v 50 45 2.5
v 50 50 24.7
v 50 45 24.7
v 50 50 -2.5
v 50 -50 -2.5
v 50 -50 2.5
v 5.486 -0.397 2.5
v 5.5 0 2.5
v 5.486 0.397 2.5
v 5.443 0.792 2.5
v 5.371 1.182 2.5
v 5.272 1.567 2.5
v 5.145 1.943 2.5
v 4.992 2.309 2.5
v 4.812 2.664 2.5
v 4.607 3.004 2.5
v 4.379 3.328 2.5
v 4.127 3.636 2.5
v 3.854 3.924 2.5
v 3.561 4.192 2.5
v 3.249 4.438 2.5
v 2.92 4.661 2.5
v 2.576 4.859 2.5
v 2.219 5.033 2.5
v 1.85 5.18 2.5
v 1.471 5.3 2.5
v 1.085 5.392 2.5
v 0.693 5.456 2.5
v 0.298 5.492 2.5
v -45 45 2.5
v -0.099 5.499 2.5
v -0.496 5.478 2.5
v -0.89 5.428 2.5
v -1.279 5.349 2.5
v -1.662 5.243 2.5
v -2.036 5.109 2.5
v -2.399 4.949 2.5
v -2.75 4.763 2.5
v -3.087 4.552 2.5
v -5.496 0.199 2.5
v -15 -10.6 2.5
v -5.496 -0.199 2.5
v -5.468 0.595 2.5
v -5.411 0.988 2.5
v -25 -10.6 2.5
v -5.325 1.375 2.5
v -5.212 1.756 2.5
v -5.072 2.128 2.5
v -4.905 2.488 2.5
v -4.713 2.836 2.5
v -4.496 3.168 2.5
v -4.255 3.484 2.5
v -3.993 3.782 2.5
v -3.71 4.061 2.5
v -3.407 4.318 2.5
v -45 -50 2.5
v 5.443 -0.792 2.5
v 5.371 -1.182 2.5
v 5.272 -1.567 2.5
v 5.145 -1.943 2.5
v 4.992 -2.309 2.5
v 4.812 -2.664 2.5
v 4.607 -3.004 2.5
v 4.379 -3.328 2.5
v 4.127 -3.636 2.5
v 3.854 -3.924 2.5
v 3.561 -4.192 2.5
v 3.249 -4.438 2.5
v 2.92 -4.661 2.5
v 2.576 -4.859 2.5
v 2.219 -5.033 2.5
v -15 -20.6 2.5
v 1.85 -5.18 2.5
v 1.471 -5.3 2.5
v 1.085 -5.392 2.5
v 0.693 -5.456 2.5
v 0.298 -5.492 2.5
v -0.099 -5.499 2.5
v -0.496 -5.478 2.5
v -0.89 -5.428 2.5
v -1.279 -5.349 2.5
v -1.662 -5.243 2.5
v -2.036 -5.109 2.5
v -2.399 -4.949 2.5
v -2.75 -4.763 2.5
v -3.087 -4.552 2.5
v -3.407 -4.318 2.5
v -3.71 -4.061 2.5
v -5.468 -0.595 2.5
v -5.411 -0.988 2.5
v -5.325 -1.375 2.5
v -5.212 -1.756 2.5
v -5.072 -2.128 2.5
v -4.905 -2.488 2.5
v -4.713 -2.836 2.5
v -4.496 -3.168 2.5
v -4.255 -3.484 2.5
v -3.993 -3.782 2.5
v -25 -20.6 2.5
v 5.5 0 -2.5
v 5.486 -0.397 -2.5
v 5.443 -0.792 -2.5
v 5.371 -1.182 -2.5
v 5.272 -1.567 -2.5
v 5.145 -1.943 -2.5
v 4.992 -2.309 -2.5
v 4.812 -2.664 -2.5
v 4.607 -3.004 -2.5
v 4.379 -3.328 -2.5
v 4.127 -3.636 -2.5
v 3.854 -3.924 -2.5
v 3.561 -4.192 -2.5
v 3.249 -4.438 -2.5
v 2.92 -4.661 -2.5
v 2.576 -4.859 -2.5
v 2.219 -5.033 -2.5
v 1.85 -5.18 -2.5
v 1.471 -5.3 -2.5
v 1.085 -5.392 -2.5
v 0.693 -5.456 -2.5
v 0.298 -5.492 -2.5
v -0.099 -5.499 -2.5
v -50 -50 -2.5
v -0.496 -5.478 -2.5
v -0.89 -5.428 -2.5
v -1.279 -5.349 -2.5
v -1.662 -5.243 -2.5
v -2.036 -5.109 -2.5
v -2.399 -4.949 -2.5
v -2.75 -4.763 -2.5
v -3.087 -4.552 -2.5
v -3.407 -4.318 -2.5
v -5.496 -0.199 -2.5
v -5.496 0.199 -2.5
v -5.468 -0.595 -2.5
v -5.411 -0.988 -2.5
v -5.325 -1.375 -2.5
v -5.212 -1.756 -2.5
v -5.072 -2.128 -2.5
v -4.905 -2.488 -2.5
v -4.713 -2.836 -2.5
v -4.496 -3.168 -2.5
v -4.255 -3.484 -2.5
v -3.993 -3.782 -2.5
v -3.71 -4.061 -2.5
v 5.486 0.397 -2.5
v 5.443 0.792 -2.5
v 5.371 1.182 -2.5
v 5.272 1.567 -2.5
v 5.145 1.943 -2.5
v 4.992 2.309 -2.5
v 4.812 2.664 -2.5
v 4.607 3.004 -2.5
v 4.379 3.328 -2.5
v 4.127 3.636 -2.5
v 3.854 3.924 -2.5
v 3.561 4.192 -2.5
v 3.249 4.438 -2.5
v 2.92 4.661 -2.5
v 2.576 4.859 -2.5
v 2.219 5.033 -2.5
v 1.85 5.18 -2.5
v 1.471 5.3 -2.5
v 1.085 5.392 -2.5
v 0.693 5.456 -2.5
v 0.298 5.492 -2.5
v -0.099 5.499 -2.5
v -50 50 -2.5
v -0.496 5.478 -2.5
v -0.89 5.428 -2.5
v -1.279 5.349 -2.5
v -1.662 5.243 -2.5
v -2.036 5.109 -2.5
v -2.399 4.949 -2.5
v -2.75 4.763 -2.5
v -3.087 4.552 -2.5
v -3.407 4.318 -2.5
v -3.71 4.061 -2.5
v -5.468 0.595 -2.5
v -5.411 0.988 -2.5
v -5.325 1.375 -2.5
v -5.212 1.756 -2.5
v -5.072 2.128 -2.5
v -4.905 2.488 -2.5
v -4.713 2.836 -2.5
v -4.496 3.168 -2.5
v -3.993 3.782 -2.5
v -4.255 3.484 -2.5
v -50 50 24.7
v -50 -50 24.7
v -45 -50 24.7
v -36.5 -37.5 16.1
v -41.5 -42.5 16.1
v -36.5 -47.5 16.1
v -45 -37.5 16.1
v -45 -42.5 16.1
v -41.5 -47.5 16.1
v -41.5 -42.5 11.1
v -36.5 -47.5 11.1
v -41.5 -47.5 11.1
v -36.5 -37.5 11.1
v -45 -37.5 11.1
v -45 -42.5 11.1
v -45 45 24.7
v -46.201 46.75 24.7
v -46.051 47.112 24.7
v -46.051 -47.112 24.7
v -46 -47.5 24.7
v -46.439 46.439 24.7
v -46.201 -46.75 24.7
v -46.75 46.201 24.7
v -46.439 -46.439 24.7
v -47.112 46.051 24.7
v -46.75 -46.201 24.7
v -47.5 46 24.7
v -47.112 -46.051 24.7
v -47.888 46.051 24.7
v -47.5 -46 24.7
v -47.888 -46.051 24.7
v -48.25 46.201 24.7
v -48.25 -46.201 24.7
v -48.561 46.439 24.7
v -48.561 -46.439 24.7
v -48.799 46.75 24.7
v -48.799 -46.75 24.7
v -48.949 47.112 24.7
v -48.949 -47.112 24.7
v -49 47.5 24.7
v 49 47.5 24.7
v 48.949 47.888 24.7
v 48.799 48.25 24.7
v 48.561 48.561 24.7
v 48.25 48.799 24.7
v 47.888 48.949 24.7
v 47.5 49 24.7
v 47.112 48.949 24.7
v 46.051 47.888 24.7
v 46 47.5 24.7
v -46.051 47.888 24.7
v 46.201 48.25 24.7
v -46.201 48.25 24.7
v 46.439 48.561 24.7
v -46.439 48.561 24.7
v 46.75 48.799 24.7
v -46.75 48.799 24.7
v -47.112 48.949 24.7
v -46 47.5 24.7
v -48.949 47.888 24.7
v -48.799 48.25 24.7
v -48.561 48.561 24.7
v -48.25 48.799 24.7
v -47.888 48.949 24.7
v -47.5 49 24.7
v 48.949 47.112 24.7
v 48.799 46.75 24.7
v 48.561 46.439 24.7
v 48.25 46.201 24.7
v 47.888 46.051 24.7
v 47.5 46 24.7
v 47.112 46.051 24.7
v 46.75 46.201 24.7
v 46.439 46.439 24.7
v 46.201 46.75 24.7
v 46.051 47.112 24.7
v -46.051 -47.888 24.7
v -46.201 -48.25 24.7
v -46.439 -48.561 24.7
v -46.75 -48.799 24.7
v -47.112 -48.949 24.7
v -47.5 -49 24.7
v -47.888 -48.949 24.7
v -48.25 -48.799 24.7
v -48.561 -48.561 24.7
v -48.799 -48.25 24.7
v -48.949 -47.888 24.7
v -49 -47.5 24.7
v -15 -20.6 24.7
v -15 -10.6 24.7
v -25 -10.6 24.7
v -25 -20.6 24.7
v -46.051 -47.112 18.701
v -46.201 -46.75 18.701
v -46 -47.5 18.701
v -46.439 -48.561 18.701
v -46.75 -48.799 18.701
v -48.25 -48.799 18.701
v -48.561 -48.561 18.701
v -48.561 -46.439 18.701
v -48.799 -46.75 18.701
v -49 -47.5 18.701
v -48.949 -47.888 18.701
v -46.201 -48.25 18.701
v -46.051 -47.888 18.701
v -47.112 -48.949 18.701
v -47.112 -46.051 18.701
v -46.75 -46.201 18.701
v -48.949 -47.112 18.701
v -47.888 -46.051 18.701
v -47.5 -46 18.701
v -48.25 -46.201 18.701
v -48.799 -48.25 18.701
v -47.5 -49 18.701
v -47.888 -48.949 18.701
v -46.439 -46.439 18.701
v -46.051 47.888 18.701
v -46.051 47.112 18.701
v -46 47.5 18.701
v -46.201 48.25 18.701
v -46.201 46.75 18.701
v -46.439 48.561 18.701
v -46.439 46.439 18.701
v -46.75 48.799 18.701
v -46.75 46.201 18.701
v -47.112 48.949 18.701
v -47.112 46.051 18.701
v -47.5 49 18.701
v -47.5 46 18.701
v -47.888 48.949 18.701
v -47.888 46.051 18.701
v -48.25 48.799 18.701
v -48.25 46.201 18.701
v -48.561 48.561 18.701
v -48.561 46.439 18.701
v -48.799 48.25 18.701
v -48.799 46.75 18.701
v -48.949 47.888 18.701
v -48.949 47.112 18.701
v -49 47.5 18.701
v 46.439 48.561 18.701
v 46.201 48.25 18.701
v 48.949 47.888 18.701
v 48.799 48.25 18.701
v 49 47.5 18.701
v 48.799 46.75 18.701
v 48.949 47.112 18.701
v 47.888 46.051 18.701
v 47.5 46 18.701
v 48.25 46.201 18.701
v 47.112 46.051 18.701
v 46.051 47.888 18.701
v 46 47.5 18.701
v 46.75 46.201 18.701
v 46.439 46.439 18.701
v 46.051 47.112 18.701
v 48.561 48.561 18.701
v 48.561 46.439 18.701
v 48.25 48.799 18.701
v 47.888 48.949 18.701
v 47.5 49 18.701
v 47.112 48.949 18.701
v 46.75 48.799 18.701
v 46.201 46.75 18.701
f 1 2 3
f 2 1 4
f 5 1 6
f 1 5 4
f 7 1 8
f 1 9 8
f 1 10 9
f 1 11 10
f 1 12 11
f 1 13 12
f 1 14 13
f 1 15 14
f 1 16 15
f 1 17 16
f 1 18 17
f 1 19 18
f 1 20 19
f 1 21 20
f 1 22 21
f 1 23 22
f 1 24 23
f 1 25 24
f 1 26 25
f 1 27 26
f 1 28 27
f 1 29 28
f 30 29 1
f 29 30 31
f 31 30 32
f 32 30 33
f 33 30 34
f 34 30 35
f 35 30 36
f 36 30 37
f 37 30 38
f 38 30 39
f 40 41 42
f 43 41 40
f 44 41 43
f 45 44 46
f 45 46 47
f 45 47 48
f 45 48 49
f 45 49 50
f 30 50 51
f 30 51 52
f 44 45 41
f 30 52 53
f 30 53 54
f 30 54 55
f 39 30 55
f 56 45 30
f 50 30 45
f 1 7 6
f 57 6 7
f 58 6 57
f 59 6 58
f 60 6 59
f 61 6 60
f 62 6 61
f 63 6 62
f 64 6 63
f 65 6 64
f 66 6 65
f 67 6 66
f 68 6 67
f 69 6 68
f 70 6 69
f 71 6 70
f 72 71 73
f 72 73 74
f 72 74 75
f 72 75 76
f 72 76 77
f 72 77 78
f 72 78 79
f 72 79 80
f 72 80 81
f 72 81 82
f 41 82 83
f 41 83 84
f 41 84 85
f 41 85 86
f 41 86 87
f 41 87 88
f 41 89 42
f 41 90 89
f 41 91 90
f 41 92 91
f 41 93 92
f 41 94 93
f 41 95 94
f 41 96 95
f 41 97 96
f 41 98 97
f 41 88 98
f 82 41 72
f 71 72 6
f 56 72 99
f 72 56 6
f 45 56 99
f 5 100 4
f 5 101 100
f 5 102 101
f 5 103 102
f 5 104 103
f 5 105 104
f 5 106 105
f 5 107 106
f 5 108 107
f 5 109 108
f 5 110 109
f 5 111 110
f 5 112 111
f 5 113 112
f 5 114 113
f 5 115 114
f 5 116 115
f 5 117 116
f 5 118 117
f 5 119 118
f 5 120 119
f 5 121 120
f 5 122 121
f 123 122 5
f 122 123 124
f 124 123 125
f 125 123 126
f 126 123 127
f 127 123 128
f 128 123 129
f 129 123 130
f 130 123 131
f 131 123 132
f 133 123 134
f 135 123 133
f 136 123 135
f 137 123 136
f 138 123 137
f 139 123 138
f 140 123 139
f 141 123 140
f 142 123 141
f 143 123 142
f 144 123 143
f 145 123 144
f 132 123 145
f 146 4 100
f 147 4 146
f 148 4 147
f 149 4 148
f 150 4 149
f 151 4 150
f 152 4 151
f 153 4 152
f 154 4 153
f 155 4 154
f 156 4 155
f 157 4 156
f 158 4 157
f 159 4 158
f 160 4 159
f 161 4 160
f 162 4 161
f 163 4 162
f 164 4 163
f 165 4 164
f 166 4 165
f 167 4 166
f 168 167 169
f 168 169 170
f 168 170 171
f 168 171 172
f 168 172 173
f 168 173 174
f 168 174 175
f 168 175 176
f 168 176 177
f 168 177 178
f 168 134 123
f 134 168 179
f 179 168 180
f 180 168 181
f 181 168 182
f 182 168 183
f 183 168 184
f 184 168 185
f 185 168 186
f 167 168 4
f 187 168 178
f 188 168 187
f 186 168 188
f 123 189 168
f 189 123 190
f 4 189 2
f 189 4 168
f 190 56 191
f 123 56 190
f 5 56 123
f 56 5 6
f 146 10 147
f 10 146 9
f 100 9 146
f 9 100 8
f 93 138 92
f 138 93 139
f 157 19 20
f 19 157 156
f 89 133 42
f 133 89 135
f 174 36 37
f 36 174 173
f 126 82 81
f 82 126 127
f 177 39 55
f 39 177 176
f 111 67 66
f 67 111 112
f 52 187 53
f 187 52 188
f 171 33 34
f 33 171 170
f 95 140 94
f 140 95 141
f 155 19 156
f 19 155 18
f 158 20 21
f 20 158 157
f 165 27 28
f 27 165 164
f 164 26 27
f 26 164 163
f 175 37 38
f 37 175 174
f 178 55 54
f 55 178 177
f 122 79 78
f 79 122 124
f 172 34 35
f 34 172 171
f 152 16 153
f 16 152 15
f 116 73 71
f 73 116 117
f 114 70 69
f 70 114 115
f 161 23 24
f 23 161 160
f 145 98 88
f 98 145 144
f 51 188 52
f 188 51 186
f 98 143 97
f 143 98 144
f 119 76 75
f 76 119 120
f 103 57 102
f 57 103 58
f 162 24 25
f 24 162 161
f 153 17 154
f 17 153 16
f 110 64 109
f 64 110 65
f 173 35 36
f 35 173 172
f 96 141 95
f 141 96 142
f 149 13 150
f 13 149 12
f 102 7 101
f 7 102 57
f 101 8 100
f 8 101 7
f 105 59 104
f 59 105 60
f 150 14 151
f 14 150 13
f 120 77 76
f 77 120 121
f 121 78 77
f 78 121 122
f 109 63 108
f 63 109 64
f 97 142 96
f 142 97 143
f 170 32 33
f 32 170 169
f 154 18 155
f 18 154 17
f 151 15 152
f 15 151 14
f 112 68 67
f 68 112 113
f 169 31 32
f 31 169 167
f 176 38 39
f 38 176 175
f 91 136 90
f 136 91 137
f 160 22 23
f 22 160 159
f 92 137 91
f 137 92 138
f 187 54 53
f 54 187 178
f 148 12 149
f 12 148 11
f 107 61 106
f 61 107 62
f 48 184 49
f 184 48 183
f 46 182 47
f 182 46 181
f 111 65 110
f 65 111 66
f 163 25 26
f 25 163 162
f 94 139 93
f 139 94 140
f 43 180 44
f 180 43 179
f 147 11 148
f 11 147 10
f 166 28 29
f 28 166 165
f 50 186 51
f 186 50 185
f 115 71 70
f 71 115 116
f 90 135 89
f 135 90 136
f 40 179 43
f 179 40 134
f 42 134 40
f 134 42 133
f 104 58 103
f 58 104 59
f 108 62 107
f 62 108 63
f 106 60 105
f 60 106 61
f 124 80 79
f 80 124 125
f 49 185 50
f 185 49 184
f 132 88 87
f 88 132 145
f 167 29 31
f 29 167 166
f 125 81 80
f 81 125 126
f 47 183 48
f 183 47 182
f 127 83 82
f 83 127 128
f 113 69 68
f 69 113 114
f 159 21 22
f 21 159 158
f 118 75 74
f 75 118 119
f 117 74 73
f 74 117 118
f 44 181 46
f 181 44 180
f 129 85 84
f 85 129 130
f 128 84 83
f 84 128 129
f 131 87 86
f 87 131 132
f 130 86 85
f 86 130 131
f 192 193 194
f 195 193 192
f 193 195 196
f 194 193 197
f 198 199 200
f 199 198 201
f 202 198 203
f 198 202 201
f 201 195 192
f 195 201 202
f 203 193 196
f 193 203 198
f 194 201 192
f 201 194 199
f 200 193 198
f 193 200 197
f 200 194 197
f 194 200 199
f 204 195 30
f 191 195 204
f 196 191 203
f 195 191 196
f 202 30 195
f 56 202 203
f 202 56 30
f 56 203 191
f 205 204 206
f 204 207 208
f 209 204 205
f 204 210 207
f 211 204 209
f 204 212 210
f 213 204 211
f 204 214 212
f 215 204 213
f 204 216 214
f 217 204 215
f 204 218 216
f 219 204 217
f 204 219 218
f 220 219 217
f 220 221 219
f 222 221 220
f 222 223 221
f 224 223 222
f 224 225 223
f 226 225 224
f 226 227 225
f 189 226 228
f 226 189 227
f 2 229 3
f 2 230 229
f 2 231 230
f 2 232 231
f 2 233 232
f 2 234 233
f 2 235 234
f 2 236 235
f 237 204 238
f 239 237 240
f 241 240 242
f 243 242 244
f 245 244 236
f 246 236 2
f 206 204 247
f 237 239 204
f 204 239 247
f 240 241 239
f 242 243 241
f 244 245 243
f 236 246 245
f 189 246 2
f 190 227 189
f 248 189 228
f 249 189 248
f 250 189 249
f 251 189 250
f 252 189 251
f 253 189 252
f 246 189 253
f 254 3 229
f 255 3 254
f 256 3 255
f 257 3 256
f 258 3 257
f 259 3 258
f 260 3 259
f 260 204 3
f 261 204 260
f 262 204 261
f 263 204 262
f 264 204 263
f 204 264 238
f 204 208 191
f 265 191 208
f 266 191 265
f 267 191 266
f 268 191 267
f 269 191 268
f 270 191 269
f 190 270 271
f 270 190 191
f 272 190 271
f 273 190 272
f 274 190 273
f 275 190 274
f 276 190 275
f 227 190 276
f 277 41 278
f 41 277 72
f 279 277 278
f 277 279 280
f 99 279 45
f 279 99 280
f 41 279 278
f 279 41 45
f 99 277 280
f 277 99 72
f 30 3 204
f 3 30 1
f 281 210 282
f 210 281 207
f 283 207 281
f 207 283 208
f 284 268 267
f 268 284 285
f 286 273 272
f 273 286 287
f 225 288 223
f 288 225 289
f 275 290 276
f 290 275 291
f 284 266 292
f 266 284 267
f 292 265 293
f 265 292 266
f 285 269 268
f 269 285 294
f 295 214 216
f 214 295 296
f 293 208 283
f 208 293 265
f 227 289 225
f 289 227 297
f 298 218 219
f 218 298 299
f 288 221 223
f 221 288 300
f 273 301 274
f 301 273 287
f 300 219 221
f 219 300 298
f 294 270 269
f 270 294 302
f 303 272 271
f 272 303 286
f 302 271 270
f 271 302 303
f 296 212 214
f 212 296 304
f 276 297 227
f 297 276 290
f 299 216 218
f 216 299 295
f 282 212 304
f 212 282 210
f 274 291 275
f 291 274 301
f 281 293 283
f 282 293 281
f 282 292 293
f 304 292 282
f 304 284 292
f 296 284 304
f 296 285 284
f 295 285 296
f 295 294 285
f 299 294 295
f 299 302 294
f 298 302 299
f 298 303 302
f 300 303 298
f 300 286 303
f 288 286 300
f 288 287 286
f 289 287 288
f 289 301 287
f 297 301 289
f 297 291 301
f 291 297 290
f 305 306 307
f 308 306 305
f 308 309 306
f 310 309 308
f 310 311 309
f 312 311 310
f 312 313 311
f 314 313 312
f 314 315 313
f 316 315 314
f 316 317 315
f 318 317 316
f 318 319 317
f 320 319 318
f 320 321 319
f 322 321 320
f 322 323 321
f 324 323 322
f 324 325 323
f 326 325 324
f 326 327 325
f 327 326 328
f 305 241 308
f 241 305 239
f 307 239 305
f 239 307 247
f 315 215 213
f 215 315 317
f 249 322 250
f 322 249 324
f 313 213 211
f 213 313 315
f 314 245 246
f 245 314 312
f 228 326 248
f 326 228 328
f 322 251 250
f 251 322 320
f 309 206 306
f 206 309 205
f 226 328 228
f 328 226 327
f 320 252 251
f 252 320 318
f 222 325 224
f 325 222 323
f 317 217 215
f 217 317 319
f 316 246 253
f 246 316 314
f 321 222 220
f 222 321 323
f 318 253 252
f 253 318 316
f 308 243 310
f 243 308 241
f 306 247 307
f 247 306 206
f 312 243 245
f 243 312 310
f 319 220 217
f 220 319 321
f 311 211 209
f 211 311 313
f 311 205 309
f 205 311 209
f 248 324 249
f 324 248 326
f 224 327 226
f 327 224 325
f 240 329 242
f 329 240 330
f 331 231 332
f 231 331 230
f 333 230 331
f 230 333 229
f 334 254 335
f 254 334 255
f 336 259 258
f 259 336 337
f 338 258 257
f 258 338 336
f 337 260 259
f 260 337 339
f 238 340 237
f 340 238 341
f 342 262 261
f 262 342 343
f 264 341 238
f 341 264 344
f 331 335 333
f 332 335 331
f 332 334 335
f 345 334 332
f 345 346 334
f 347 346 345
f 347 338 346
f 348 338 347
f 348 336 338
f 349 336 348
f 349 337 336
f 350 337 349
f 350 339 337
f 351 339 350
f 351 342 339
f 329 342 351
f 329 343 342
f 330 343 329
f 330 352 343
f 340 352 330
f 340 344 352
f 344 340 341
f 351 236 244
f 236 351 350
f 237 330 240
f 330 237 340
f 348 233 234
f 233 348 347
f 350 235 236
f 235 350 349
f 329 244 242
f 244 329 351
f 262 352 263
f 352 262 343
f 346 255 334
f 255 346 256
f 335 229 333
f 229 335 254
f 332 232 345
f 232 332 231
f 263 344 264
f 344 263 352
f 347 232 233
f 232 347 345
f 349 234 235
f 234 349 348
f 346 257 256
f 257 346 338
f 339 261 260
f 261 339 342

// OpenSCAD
$fa = 1;
$fs = 0.4;

mallet_length = 393;
mallet_sphere_radius = 39.6/2;
axel_radius = 5;
side_wall_thickness = 5;
mallet_handle_radius=9.6/2;
side_wall_center_distance = mallet_handle_radius*2+1.5+side_wall_thickness/2;

module mallet() {
    cylinder(h=mallet_length+mallet_sphere_radius, r=mallet_handle_radius);
    translate([0, 0, mallet_length+mallet_sphere_radius])
        sphere(r=mallet_sphere_radius, center=true);
}

module side_wall() {
    difference() {
        cube([100, 100, side_wall_thickness], center=true);
        translate([0, 0, 0])
            cylinder(h=side_wall_thickness+1, r=axel_radius*1.1, center=true);
    }
}

module side_wall_right() {
    difference() {
        side_wall();
        translate([0, 0, -side_wall_thickness-0.1])
            rotate([180, 0, 0])
            screw_holes(side_wall_thickness*2, 3, 50);  // 3mm width holes
    }
}

module side_wall_left() {
    wall_to_wall_distance = side_wall_center_distance*2-side_wall_thickness/2;
    side_wall();
    difference() {
        union() {
            translate([-20, -(mallet_handle_radius*2+5)-1, wall_to_wall_distance/2])//The -1 give some space for the felt stopper
                cube([10,10,wall_to_wall_distance],center=true);
            translate([-50, -50, 0])
                union() {
                    cube([side_wall_thickness, 100, wall_to_wall_distance]);
                    translate([side_wall_thickness+2, 10, wall_to_wall_distance/2+side_wall_thickness/4])
                        union(){
                        cube([10,5,5],center= true);    
                        translate([4,-2.5,0])
                            cube([5,10,5],center=true);
                        }
                };
            translate([-50, 50, 0])
                rotate([0, 0, -90])
                cube([side_wall_thickness, 100, wall_to_wall_distance]);
        }
        translate([0, 0, wall_to_wall_distance])
            screw_holes(6, 3, 50);  // 6mm deep 3mm width holes
    }
}

module mallet_car() {
    difference() {
        union() {
            cylinder(h=70, r=mallet_handle_radius*2, center=true);
            rotate([90, 0, 0])
                cylinder(h=2*(mallet_handle_radius*2+side_wall_thickness+2), r=axel_radius, center=true);
            rotate([90, 0, 0])
                cylinder(h=2*(mallet_handle_radius*2+1), r=axel_radius*2, center=true);
            translate([-mallet_handle_radius*2, 0, -29])
                rotate([90, 0, 0])
                rubber_attachment();
        }
        translate([mallet_handle_radius, 0, 30])
            rotate([0, 90, 0])
                cylinder(h=mallet_handle_radius*2, r=3/2,center = true);
        translate([mallet_handle_radius, 0, -25])
            rotate([0, 90, 0])
                cylinder(h=mallet_handle_radius*2, r=3/2,center = true);
        
        translate([0, 0, -30])
            scale(1.05)
            mallet();
    }
    
}

module rubber_attachment() {
    rotate_extrude(angle=360) {
        translate([4, 0, 0])
            circle(r=1.5);
    }
}

module mallet_holder() {
    translate([0, side_wall_center_distance, 0])
        rotate([90, 0, 0])
        side_wall_right();

    translate([0, -side_wall_center_distance, 0])
        rotate([-90, 0, 0])
        side_wall_left();

    rotate([0, 90, 0])
        mallet_car();
}

module screw_holes(depth, width, corners) {
    posVal = corners - side_wall_thickness / 2;
    translate([0, 0, -depth+0.001]) {
        translate([-posVal, -posVal, 0])
            cylinder(h=depth, r=width/2);
        translate([-posVal, posVal, 0])
            cylinder(h=depth, r=width/2);
        translate([posVal, posVal, 0])
            cylinder(h=depth, r=width/2);
    }
}

//mallet_holder();

// translate([100, 100, 0])
    // side_wall_left();
    // side_wall_right();

 //mallet_car();
 side_wall_left();
 //side_wall_right();
